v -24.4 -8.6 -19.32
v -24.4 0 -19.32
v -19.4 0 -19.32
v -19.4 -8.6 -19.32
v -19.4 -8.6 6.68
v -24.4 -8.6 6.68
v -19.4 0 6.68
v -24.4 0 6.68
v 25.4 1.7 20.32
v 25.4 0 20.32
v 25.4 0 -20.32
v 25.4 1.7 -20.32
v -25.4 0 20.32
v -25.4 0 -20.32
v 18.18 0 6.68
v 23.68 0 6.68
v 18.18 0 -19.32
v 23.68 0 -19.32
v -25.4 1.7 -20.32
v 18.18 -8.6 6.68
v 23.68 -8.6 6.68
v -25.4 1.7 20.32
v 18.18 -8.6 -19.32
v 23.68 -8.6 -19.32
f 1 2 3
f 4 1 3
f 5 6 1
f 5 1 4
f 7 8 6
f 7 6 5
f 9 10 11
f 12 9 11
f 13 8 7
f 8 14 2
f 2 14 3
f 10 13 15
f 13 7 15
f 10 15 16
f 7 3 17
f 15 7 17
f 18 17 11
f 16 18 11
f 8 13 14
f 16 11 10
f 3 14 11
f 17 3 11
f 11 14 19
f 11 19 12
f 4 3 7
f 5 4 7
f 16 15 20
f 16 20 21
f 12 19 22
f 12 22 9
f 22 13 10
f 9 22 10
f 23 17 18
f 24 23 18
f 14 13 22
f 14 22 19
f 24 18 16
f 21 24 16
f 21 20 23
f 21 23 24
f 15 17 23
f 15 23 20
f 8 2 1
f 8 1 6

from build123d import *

# Parameters (mm, degrees)
SKETCH1_W           = 50.8
SKETCH1_H           = 40.64
BOSS_EXTRUDE1_DEPTH = 1.7
SKETCH2_W           = 5
SKETCH2_H           = 26
BOSS_EXTRUDE2_DEPTH = 8.6
SKETCH3_W           = 5.5
SKETCH3_H           = 26
BOSS_EXTRUDE3_DEPTH = 8.6


with BuildPart() as part:
    # Sketch1 → Boss-Extrude1 (new body)
    with BuildSketch(Plane(origin=(0, 0, 0), x_dir=(1, 0, 0), z_dir=(0, 1, 0))):
        Rectangle(SKETCH1_W, SKETCH1_H)
    extrude(amount=BOSS_EXTRUDE1_DEPTH)

    # Sketch2 → Boss-Extrude2 (add)
    with BuildSketch(Plane.XZ):
        with Locations((-21.9, -6.32)):
            Rectangle(SKETCH2_W, SKETCH2_H)
    extrude(amount=BOSS_EXTRUDE2_DEPTH)

    # Sketch3 → Boss-Extrude3 (add)
    with BuildSketch(Plane.XZ):
        with Locations((20.93, -6.32)):
            Rectangle(SKETCH3_W, SKETCH3_H)
    extrude(amount=BOSS_EXTRUDE3_DEPTH)


solid = part.part
